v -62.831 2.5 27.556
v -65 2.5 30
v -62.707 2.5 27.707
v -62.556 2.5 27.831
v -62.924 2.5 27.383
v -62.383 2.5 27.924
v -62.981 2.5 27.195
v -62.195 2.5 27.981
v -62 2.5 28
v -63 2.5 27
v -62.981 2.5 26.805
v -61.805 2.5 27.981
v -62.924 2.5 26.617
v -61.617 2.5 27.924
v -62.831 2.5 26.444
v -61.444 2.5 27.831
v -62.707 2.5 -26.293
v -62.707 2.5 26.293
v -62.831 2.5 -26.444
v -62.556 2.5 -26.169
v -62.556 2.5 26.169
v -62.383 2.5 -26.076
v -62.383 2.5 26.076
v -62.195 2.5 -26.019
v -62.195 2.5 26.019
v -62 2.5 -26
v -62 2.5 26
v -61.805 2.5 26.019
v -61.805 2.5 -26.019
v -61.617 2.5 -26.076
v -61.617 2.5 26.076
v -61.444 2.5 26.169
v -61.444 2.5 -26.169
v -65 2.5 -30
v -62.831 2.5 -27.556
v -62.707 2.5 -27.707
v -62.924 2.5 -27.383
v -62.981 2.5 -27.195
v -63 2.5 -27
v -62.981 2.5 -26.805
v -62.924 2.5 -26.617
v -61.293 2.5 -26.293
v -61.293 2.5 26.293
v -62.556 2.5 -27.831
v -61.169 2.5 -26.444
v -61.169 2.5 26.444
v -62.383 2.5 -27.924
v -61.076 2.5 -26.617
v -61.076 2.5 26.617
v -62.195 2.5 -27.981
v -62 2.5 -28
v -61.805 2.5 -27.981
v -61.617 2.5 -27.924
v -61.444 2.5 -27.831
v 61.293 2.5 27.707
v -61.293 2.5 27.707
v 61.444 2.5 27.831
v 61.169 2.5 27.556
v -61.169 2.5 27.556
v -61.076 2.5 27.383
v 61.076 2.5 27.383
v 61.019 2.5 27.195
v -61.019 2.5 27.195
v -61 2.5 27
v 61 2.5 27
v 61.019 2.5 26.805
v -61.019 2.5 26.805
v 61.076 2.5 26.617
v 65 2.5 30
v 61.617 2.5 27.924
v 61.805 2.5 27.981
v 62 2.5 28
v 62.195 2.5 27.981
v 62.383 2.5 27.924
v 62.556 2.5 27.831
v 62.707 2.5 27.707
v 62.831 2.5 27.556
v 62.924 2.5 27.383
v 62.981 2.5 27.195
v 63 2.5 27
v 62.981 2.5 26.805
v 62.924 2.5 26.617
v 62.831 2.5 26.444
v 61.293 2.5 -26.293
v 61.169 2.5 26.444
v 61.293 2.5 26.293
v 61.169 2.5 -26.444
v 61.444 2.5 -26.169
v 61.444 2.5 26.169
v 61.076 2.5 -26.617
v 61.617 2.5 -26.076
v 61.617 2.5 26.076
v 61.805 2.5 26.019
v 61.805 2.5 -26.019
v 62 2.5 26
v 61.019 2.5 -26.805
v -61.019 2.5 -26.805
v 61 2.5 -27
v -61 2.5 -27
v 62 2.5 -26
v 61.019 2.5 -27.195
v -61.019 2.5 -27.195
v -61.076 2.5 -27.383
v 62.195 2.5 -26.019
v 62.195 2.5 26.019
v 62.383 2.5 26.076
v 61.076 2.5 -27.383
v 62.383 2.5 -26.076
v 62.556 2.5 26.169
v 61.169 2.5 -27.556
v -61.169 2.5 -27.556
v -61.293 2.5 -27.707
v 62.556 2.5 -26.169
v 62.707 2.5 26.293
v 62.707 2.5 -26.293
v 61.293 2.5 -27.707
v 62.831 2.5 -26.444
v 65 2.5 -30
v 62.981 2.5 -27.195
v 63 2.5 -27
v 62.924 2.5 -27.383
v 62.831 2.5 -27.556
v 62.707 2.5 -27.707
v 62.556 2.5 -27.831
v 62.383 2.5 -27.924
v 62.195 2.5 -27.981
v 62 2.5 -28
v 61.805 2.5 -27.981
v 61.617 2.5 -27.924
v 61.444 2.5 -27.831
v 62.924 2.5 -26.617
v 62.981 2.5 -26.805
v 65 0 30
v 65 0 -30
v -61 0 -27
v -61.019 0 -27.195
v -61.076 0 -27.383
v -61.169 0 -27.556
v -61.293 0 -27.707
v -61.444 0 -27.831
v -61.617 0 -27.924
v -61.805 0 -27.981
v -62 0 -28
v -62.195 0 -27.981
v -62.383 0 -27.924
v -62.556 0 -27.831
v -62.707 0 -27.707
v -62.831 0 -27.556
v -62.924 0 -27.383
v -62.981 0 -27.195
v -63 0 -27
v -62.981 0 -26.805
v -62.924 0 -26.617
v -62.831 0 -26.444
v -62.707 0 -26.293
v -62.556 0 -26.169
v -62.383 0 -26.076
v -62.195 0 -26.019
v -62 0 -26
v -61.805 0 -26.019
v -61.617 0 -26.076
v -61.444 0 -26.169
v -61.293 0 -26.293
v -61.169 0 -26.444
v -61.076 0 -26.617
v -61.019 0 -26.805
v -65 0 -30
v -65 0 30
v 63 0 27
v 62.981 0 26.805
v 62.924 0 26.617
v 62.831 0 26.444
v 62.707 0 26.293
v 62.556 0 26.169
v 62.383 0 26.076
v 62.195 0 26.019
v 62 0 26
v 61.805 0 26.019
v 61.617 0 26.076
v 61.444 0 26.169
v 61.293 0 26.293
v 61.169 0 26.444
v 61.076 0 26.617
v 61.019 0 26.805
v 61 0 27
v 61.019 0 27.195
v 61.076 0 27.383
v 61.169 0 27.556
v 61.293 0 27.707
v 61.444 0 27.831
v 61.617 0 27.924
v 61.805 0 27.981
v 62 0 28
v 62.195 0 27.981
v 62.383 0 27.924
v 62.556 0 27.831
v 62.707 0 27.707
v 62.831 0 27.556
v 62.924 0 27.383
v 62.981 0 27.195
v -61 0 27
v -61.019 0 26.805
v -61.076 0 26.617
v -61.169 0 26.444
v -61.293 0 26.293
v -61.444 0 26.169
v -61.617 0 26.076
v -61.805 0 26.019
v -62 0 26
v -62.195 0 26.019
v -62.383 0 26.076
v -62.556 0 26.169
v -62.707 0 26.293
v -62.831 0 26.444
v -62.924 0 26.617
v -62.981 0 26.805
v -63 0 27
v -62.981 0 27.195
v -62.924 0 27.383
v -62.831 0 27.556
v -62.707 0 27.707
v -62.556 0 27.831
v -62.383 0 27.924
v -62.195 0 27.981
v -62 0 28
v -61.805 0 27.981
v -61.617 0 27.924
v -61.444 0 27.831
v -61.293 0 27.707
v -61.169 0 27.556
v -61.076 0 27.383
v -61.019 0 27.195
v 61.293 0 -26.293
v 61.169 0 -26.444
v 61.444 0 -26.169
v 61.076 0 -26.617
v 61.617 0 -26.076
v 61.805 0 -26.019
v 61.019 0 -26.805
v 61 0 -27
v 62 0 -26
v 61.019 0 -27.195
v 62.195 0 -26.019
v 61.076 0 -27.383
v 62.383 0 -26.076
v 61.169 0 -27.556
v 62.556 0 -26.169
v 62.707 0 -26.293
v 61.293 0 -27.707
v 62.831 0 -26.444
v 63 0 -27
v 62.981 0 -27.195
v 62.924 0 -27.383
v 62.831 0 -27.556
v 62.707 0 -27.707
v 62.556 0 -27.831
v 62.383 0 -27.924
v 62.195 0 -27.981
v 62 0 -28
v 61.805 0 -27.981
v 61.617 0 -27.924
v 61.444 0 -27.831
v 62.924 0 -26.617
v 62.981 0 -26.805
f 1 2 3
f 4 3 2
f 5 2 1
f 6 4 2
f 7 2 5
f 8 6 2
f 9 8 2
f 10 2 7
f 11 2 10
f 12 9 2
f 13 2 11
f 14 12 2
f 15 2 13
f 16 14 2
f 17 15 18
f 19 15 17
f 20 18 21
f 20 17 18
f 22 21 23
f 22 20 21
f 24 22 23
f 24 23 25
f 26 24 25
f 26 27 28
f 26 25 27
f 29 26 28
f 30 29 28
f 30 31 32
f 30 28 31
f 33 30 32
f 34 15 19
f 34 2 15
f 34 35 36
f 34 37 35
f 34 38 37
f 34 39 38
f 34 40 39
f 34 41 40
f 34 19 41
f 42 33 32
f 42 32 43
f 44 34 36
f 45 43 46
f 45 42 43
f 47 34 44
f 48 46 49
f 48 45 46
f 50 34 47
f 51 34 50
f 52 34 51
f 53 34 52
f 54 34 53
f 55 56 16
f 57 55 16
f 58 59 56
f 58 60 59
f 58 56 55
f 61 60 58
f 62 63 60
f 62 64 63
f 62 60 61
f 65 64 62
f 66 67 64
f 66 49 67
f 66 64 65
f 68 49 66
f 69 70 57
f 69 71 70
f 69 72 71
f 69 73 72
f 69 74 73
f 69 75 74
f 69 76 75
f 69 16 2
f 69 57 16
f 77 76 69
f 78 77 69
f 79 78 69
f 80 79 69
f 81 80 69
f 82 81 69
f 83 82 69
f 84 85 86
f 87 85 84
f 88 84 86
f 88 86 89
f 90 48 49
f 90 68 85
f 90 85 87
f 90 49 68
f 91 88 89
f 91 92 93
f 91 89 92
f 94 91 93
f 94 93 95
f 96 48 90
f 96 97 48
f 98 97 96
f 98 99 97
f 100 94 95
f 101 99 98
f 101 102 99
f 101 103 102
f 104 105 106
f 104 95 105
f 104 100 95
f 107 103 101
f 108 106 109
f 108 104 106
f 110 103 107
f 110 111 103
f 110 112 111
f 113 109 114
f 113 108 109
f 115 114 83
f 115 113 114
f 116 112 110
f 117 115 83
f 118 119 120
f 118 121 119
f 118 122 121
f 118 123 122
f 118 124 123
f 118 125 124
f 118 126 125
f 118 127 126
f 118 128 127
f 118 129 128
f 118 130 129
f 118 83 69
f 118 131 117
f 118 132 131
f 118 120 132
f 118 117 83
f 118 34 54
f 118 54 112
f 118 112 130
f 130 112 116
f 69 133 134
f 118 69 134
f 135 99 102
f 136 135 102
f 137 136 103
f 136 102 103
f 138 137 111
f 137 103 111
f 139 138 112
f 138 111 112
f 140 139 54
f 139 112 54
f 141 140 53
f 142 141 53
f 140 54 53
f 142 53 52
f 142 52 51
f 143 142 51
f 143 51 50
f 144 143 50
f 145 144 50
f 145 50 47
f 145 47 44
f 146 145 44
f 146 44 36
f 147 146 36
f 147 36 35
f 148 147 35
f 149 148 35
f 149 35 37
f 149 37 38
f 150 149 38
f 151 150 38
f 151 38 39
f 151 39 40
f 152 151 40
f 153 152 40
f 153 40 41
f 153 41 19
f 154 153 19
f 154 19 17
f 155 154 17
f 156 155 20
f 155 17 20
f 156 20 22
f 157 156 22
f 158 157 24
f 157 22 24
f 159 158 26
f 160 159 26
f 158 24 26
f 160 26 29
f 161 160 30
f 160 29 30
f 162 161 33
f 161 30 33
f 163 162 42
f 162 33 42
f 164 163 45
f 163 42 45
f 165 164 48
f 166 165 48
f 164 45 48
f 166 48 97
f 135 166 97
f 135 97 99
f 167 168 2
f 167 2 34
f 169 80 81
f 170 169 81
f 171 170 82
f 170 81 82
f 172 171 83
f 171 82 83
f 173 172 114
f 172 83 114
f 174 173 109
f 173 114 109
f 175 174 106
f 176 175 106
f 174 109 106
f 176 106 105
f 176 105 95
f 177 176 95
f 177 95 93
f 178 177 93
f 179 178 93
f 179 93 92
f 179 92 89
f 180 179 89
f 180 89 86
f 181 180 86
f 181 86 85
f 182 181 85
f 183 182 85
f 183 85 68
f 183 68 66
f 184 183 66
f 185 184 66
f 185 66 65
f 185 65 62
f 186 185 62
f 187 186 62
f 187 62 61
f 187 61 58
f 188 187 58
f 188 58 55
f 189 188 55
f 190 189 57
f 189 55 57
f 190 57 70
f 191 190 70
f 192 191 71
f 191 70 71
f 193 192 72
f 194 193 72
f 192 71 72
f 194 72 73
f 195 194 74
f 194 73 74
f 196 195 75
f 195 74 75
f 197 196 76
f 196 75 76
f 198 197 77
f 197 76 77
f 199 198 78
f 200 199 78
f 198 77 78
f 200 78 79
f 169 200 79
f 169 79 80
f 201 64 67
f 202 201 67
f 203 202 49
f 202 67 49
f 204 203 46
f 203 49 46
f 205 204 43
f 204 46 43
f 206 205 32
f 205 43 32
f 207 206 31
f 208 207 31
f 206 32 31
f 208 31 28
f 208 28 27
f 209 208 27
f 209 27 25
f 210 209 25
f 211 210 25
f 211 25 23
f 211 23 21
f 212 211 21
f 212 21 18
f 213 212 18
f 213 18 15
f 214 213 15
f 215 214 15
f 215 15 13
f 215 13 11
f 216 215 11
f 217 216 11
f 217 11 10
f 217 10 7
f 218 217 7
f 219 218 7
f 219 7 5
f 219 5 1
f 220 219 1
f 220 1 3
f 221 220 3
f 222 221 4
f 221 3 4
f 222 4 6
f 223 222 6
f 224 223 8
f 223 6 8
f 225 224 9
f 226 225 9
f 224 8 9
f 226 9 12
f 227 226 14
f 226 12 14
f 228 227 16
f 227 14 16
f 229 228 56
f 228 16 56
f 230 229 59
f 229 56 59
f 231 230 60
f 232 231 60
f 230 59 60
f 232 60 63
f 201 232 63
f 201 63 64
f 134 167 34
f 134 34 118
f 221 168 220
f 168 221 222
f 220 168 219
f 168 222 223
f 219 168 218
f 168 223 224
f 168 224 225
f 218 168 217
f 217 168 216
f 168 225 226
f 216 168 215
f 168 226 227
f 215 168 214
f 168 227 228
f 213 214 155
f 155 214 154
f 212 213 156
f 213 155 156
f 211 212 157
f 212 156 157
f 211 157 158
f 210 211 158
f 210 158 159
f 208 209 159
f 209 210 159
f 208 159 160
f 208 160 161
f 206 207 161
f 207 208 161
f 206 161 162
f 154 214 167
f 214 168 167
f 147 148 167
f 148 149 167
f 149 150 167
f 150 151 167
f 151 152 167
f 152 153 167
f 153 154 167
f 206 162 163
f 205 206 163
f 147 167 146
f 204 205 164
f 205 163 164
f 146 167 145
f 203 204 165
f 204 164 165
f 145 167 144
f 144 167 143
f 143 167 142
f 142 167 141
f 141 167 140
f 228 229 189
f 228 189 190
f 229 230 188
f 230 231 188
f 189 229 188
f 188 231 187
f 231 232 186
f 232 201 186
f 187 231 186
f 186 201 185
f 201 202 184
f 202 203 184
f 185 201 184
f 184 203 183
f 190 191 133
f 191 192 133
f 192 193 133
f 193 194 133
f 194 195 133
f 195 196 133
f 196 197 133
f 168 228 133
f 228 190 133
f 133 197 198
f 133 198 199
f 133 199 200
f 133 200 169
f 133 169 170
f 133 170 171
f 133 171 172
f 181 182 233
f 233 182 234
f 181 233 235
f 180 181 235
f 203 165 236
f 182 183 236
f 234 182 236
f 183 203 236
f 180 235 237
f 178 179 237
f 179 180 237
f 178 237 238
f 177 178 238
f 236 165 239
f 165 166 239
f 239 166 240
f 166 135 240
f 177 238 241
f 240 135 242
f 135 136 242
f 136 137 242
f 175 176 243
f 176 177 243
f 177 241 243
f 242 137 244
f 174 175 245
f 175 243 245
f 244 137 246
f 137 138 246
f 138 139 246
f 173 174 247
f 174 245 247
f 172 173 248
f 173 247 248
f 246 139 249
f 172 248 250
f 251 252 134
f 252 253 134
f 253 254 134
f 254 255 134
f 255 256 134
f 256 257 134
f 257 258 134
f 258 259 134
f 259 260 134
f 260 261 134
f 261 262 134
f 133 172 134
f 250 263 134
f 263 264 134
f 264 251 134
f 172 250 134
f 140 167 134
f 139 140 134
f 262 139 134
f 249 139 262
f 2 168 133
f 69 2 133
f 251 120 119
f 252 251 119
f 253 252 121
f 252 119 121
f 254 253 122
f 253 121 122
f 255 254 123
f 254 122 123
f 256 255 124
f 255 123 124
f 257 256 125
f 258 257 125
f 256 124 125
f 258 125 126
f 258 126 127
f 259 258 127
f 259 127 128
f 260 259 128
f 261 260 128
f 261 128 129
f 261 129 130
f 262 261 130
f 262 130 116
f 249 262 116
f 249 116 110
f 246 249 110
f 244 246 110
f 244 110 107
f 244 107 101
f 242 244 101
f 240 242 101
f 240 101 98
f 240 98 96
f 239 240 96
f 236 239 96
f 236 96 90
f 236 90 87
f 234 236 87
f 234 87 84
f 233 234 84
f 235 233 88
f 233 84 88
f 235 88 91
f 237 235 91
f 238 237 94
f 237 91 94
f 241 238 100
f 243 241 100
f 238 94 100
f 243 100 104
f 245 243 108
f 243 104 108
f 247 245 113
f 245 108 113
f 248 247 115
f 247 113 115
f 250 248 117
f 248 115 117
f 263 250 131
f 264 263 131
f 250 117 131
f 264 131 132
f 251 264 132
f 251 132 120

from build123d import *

# Parameters (mm, degrees)
SKETCH3_W           = 130
SKETCH3_H           = 60
BOSS_EXTRUDE1_DEPTH = 2.5
CUT_EXTRUDE1_REACH  = 4.5
SKETCH4_R           = 1


with BuildPart() as part:
    # Sketch3 → Boss-Extrude1 (new body)
    with BuildSketch(Plane(origin=(0, 0, 0), x_dir=(1, 0, 0), z_dir=(0, 1, 0))):
        Rectangle(SKETCH3_W, SKETCH3_H)
    extrude(amount=BOSS_EXTRUDE1_DEPTH)

    # Sketch4 → Cut-Extrude1 (cut, up to next)
    with BuildSketch(Plane(origin=(0, 2.5, 0), x_dir=(1, 0, 0), z_dir=(0, 1, 0)), mode=Mode.PRIVATE) as cut_extrude1_sk1:
        with Locations((-62, 27)):
            Circle(SKETCH4_R)
    cut_extrude1_tool1 = extrude(cut_extrude1_sk1.sketch, amount=-CUT_EXTRUDE1_REACH, mode=Mode.PRIVATE) & part.part
    add(cut_extrude1_tool1.solids().sort_by_distance((-62, 2.5, -27))[0], mode=Mode.SUBTRACT)
    # Sketch4 → Cut-Extrude1 (cut, up to next)
    with BuildSketch(Plane(origin=(0, 2.5, 0), x_dir=(1, 0, 0), z_dir=(0, 1, 0)), mode=Mode.PRIVATE) as cut_extrude1_sk2:
        with Locations((62, 27)):
            Circle(SKETCH4_R)
    cut_extrude1_tool2 = extrude(cut_extrude1_sk2.sketch, amount=-CUT_EXTRUDE1_REACH, mode=Mode.PRIVATE) & part.part
    add(cut_extrude1_tool2.solids().sort_by_distance((62, 2.5, -27))[0], mode=Mode.SUBTRACT)
    # Sketch4 → Cut-Extrude1 (cut, up to next)
    with BuildSketch(Plane(origin=(0, 2.5, 0), x_dir=(1, 0, 0), z_dir=(0, 1, 0)), mode=Mode.PRIVATE) as cut_extrude1_sk3:
        with Locations((62, -27)):
            Circle(SKETCH4_R)
    cut_extrude1_tool3 = extrude(cut_extrude1_sk3.sketch, amount=-CUT_EXTRUDE1_REACH, mode=Mode.PRIVATE) & part.part
    add(cut_extrude1_tool3.solids().sort_by_distance((62, 2.5, 27))[0], mode=Mode.SUBTRACT)
    # Sketch4 → Cut-Extrude1 (cut, up to next)
    with BuildSketch(Plane(origin=(0, 2.5, 0), x_dir=(1, 0, 0), z_dir=(0, 1, 0)), mode=Mode.PRIVATE) as cut_extrude1_sk4:
        with Locations((-62, -27)):
            Circle(SKETCH4_R)
    cut_extrude1_tool4 = extrude(cut_extrude1_sk4.sketch, amount=-CUT_EXTRUDE1_REACH, mode=Mode.PRIVATE) & part.part
    add(cut_extrude1_tool4.solids().sort_by_distance((-62, 2.5, 27))[0], mode=Mode.SUBTRACT)


solid = part.part
